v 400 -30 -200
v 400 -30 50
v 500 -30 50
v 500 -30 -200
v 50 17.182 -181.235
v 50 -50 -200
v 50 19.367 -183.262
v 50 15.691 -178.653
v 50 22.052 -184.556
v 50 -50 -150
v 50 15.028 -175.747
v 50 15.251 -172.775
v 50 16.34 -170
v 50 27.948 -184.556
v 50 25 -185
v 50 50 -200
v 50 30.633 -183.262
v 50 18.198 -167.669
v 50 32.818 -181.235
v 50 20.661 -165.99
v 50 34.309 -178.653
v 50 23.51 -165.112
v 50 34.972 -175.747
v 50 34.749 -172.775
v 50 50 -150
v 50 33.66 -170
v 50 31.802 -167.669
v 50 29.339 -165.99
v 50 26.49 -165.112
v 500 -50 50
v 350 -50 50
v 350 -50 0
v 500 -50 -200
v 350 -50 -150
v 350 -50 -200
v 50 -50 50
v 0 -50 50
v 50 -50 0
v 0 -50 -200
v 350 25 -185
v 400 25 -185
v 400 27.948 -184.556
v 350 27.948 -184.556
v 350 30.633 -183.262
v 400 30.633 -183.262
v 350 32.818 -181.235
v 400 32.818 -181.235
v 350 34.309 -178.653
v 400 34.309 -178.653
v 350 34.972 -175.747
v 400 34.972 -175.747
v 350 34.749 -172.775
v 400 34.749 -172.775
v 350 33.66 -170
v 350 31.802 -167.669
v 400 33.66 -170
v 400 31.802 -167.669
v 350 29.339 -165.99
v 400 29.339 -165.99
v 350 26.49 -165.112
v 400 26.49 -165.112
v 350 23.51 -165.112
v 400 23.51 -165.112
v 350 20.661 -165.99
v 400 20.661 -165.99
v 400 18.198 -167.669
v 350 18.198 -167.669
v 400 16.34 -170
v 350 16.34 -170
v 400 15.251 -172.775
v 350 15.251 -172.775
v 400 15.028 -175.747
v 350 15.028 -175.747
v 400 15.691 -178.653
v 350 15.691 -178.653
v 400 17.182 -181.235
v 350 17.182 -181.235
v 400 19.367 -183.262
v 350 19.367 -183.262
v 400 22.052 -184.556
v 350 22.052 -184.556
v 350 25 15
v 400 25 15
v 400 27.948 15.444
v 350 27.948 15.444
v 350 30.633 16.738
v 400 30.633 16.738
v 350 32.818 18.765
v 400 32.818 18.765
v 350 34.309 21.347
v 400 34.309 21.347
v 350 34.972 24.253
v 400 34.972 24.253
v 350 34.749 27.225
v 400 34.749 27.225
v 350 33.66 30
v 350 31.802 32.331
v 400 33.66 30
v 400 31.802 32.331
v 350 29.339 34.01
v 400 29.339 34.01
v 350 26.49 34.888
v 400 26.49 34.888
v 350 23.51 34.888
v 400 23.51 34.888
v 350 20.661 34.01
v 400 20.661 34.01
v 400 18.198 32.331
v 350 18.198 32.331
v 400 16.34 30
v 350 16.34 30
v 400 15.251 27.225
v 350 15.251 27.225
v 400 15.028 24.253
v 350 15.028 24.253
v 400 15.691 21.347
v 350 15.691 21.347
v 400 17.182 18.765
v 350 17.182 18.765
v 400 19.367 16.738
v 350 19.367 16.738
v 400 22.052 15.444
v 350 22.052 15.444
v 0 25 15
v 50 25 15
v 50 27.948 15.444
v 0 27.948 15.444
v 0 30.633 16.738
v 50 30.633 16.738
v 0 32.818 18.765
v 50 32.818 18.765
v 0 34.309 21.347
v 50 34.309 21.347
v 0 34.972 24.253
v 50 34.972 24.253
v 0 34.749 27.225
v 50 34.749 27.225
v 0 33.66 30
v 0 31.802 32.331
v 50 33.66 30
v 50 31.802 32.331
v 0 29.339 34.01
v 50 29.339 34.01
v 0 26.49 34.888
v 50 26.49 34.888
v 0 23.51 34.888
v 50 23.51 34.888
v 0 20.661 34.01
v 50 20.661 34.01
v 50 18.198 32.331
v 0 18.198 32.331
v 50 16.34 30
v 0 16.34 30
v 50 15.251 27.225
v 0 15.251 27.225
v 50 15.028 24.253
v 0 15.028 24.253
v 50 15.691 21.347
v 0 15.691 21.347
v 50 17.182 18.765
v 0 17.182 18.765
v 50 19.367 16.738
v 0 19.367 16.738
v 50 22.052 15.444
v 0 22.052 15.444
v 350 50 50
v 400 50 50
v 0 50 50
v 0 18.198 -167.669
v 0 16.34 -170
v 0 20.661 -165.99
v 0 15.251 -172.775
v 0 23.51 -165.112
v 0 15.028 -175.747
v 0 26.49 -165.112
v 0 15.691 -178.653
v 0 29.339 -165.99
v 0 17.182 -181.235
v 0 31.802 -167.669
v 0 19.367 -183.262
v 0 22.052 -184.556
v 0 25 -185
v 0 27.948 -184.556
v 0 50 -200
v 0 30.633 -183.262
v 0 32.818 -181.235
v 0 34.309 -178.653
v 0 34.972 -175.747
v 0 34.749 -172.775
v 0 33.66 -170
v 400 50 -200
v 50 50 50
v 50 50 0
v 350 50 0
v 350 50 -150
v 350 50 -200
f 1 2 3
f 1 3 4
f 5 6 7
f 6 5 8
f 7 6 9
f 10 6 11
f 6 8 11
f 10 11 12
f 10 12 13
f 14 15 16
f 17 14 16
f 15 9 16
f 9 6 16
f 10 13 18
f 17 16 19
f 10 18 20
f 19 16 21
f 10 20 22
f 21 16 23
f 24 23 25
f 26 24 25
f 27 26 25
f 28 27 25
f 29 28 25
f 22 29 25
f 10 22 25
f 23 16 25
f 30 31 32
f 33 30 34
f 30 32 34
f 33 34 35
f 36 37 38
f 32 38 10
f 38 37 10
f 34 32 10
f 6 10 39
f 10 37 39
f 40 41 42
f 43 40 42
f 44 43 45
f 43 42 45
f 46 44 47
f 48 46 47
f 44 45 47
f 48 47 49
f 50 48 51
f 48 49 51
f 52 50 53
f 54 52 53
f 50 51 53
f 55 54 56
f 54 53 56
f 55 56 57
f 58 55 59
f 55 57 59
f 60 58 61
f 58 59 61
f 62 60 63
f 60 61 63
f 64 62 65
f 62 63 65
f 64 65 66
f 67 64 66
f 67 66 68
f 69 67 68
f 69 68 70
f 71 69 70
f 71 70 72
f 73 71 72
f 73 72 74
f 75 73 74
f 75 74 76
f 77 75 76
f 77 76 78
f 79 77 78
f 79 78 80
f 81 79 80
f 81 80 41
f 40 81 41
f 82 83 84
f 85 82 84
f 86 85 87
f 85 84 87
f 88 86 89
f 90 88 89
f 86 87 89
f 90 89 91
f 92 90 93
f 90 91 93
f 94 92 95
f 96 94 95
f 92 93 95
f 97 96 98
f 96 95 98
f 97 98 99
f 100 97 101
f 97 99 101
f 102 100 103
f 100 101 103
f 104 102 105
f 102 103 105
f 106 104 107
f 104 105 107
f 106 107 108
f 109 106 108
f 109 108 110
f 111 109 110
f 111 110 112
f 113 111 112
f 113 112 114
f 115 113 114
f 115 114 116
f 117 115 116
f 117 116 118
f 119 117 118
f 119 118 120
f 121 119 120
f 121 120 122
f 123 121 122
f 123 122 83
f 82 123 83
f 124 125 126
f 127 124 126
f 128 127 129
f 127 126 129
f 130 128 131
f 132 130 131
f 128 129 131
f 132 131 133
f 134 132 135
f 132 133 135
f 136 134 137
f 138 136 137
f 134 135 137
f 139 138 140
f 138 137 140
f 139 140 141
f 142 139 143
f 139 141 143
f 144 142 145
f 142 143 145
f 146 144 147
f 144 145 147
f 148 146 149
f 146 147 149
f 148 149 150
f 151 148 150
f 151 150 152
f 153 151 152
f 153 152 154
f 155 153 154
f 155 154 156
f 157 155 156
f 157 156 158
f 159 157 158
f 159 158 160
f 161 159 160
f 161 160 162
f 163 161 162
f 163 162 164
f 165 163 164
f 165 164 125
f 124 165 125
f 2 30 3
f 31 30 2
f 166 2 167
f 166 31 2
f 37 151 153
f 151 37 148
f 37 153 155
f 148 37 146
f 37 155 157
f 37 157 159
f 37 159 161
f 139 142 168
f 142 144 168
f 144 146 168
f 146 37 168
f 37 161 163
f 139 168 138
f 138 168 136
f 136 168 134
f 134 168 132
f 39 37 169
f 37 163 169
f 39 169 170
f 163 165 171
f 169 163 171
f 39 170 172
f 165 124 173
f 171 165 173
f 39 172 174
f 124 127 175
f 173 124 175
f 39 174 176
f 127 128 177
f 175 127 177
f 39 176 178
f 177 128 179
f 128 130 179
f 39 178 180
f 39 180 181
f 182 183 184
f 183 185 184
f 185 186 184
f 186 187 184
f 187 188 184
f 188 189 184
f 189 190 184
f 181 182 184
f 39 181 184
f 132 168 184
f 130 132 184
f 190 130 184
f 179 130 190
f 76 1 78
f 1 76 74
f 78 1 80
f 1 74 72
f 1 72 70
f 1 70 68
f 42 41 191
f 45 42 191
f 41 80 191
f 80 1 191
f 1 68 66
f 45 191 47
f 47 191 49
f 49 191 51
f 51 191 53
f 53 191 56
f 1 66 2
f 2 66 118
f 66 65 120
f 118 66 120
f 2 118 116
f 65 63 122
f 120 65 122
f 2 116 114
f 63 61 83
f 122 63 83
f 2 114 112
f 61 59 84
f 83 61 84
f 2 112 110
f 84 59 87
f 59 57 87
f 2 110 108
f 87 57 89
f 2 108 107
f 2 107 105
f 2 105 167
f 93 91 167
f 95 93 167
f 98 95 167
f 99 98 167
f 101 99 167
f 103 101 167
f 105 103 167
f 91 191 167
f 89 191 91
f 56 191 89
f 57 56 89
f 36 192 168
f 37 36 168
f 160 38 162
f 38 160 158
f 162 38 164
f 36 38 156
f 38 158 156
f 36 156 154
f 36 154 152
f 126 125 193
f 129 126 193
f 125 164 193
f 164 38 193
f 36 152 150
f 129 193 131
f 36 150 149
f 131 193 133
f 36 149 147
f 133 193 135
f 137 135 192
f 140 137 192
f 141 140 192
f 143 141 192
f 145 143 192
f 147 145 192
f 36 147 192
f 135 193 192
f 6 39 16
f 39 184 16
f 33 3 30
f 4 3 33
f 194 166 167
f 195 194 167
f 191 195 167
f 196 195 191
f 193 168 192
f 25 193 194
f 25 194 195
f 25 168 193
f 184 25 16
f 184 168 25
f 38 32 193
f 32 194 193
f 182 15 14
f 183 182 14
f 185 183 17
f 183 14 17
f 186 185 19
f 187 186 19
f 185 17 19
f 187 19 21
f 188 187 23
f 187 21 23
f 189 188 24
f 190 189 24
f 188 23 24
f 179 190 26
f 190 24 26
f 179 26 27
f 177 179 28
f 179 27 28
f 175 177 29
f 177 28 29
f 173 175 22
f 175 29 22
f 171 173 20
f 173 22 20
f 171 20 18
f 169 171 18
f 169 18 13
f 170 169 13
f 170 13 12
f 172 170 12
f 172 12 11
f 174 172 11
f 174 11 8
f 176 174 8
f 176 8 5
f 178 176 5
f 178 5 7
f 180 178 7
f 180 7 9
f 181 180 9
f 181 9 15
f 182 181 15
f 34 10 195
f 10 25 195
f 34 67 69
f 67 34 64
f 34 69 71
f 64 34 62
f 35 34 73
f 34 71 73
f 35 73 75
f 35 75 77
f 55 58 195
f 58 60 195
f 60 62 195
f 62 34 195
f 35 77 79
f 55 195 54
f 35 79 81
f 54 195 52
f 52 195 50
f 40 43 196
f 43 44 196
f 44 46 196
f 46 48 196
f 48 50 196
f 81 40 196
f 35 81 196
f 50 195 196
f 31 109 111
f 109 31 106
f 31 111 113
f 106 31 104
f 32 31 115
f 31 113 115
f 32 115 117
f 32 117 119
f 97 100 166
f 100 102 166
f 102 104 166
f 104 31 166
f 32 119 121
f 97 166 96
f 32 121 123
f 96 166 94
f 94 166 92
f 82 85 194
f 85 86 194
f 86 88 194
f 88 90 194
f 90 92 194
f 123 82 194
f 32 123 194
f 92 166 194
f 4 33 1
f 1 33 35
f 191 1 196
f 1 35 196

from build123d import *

# Parameters (mm, degrees)
SKETCH2_W           = 400
SKETCH2_H           = 150
BOSS_EXTRUDE1_DEPTH = 50
SKETCH3_W           = 50
SKETCH3_H           = 50
BOSS_EXTRUDE2_DEPTH = 50
SKETCH4_R           = 10
CUT_EXTRUDE1_DEPTH  = 444
BOSS_EXTRUDE3_DEPTH = 50
SKETCH7_W           = 250
SKETCH7_H           = 20
BOSS_EXTRUDE4_DEPTH = 100


with BuildPart() as part:
    # Sketch2 → Boss-Extrude1 (new body)
    with BuildSketch(Plane(origin=(0, 0, 0), x_dir=(1, 0, 0), z_dir=(0, 1, 0))):
        with Locations((200, 75)):
            Rectangle(SKETCH2_W, SKETCH2_H)
    extrude(amount=BOSS_EXTRUDE1_DEPTH)

    # Sketch3 → Boss-Extrude2 (add)
    with BuildSketch(Plane(origin=(400, 0, 0), x_dir=(0, 0, -1), z_dir=(1, 0, 0))):
        with Locations((-25, 25)):
            Rectangle(SKETCH3_W, SKETCH3_H)
        with Locations((175, 25)):
            Rectangle(SKETCH3_W, SKETCH3_H)
    boss_extrude2 = extrude(amount=-BOSS_EXTRUDE2_DEPTH)

    # Mirror4: Boss-Extrude2 across plane
    add(boss_extrude2.mirror(Plane(origin=(200, 0, 0), x_dir=(0, 0, 1), z_dir=(1, 0, 0))))

    # Sketch4 → Cut-Extrude1 (cut)
    with BuildSketch(Plane(origin=(400, 0, 0), x_dir=(0, 0, -1), z_dir=(1, 0, 0))):
        with Locations((-25, 25)):
            Circle(SKETCH4_R)
        with Locations((175, 25)):
            Circle(SKETCH4_R)
    extrude(amount=-CUT_EXTRUDE1_DEPTH, mode=Mode.SUBTRACT)

    # Sketch6 → Boss-Extrude3 (add)
    with BuildSketch(Plane.XZ):
        Polygon((0, 50), (0, -200), (50, -200), (50, -150), (350, -150), (350, -200), (400, -200), (400, 50), (350, 50), (350, 0), (50, 0), (50, 50), align=None)
    extrude(amount=BOSS_EXTRUDE3_DEPTH)

    # Sketch7 → Boss-Extrude4 (add)
    with BuildSketch(Plane(origin=(400, 0, 0), x_dir=(0, 0, -1), z_dir=(1, 0, 0))):
        with Locations((75, -40)):
            Rectangle(SKETCH7_W, SKETCH7_H)
    extrude(amount=BOSS_EXTRUDE4_DEPTH)


solid = part.part
